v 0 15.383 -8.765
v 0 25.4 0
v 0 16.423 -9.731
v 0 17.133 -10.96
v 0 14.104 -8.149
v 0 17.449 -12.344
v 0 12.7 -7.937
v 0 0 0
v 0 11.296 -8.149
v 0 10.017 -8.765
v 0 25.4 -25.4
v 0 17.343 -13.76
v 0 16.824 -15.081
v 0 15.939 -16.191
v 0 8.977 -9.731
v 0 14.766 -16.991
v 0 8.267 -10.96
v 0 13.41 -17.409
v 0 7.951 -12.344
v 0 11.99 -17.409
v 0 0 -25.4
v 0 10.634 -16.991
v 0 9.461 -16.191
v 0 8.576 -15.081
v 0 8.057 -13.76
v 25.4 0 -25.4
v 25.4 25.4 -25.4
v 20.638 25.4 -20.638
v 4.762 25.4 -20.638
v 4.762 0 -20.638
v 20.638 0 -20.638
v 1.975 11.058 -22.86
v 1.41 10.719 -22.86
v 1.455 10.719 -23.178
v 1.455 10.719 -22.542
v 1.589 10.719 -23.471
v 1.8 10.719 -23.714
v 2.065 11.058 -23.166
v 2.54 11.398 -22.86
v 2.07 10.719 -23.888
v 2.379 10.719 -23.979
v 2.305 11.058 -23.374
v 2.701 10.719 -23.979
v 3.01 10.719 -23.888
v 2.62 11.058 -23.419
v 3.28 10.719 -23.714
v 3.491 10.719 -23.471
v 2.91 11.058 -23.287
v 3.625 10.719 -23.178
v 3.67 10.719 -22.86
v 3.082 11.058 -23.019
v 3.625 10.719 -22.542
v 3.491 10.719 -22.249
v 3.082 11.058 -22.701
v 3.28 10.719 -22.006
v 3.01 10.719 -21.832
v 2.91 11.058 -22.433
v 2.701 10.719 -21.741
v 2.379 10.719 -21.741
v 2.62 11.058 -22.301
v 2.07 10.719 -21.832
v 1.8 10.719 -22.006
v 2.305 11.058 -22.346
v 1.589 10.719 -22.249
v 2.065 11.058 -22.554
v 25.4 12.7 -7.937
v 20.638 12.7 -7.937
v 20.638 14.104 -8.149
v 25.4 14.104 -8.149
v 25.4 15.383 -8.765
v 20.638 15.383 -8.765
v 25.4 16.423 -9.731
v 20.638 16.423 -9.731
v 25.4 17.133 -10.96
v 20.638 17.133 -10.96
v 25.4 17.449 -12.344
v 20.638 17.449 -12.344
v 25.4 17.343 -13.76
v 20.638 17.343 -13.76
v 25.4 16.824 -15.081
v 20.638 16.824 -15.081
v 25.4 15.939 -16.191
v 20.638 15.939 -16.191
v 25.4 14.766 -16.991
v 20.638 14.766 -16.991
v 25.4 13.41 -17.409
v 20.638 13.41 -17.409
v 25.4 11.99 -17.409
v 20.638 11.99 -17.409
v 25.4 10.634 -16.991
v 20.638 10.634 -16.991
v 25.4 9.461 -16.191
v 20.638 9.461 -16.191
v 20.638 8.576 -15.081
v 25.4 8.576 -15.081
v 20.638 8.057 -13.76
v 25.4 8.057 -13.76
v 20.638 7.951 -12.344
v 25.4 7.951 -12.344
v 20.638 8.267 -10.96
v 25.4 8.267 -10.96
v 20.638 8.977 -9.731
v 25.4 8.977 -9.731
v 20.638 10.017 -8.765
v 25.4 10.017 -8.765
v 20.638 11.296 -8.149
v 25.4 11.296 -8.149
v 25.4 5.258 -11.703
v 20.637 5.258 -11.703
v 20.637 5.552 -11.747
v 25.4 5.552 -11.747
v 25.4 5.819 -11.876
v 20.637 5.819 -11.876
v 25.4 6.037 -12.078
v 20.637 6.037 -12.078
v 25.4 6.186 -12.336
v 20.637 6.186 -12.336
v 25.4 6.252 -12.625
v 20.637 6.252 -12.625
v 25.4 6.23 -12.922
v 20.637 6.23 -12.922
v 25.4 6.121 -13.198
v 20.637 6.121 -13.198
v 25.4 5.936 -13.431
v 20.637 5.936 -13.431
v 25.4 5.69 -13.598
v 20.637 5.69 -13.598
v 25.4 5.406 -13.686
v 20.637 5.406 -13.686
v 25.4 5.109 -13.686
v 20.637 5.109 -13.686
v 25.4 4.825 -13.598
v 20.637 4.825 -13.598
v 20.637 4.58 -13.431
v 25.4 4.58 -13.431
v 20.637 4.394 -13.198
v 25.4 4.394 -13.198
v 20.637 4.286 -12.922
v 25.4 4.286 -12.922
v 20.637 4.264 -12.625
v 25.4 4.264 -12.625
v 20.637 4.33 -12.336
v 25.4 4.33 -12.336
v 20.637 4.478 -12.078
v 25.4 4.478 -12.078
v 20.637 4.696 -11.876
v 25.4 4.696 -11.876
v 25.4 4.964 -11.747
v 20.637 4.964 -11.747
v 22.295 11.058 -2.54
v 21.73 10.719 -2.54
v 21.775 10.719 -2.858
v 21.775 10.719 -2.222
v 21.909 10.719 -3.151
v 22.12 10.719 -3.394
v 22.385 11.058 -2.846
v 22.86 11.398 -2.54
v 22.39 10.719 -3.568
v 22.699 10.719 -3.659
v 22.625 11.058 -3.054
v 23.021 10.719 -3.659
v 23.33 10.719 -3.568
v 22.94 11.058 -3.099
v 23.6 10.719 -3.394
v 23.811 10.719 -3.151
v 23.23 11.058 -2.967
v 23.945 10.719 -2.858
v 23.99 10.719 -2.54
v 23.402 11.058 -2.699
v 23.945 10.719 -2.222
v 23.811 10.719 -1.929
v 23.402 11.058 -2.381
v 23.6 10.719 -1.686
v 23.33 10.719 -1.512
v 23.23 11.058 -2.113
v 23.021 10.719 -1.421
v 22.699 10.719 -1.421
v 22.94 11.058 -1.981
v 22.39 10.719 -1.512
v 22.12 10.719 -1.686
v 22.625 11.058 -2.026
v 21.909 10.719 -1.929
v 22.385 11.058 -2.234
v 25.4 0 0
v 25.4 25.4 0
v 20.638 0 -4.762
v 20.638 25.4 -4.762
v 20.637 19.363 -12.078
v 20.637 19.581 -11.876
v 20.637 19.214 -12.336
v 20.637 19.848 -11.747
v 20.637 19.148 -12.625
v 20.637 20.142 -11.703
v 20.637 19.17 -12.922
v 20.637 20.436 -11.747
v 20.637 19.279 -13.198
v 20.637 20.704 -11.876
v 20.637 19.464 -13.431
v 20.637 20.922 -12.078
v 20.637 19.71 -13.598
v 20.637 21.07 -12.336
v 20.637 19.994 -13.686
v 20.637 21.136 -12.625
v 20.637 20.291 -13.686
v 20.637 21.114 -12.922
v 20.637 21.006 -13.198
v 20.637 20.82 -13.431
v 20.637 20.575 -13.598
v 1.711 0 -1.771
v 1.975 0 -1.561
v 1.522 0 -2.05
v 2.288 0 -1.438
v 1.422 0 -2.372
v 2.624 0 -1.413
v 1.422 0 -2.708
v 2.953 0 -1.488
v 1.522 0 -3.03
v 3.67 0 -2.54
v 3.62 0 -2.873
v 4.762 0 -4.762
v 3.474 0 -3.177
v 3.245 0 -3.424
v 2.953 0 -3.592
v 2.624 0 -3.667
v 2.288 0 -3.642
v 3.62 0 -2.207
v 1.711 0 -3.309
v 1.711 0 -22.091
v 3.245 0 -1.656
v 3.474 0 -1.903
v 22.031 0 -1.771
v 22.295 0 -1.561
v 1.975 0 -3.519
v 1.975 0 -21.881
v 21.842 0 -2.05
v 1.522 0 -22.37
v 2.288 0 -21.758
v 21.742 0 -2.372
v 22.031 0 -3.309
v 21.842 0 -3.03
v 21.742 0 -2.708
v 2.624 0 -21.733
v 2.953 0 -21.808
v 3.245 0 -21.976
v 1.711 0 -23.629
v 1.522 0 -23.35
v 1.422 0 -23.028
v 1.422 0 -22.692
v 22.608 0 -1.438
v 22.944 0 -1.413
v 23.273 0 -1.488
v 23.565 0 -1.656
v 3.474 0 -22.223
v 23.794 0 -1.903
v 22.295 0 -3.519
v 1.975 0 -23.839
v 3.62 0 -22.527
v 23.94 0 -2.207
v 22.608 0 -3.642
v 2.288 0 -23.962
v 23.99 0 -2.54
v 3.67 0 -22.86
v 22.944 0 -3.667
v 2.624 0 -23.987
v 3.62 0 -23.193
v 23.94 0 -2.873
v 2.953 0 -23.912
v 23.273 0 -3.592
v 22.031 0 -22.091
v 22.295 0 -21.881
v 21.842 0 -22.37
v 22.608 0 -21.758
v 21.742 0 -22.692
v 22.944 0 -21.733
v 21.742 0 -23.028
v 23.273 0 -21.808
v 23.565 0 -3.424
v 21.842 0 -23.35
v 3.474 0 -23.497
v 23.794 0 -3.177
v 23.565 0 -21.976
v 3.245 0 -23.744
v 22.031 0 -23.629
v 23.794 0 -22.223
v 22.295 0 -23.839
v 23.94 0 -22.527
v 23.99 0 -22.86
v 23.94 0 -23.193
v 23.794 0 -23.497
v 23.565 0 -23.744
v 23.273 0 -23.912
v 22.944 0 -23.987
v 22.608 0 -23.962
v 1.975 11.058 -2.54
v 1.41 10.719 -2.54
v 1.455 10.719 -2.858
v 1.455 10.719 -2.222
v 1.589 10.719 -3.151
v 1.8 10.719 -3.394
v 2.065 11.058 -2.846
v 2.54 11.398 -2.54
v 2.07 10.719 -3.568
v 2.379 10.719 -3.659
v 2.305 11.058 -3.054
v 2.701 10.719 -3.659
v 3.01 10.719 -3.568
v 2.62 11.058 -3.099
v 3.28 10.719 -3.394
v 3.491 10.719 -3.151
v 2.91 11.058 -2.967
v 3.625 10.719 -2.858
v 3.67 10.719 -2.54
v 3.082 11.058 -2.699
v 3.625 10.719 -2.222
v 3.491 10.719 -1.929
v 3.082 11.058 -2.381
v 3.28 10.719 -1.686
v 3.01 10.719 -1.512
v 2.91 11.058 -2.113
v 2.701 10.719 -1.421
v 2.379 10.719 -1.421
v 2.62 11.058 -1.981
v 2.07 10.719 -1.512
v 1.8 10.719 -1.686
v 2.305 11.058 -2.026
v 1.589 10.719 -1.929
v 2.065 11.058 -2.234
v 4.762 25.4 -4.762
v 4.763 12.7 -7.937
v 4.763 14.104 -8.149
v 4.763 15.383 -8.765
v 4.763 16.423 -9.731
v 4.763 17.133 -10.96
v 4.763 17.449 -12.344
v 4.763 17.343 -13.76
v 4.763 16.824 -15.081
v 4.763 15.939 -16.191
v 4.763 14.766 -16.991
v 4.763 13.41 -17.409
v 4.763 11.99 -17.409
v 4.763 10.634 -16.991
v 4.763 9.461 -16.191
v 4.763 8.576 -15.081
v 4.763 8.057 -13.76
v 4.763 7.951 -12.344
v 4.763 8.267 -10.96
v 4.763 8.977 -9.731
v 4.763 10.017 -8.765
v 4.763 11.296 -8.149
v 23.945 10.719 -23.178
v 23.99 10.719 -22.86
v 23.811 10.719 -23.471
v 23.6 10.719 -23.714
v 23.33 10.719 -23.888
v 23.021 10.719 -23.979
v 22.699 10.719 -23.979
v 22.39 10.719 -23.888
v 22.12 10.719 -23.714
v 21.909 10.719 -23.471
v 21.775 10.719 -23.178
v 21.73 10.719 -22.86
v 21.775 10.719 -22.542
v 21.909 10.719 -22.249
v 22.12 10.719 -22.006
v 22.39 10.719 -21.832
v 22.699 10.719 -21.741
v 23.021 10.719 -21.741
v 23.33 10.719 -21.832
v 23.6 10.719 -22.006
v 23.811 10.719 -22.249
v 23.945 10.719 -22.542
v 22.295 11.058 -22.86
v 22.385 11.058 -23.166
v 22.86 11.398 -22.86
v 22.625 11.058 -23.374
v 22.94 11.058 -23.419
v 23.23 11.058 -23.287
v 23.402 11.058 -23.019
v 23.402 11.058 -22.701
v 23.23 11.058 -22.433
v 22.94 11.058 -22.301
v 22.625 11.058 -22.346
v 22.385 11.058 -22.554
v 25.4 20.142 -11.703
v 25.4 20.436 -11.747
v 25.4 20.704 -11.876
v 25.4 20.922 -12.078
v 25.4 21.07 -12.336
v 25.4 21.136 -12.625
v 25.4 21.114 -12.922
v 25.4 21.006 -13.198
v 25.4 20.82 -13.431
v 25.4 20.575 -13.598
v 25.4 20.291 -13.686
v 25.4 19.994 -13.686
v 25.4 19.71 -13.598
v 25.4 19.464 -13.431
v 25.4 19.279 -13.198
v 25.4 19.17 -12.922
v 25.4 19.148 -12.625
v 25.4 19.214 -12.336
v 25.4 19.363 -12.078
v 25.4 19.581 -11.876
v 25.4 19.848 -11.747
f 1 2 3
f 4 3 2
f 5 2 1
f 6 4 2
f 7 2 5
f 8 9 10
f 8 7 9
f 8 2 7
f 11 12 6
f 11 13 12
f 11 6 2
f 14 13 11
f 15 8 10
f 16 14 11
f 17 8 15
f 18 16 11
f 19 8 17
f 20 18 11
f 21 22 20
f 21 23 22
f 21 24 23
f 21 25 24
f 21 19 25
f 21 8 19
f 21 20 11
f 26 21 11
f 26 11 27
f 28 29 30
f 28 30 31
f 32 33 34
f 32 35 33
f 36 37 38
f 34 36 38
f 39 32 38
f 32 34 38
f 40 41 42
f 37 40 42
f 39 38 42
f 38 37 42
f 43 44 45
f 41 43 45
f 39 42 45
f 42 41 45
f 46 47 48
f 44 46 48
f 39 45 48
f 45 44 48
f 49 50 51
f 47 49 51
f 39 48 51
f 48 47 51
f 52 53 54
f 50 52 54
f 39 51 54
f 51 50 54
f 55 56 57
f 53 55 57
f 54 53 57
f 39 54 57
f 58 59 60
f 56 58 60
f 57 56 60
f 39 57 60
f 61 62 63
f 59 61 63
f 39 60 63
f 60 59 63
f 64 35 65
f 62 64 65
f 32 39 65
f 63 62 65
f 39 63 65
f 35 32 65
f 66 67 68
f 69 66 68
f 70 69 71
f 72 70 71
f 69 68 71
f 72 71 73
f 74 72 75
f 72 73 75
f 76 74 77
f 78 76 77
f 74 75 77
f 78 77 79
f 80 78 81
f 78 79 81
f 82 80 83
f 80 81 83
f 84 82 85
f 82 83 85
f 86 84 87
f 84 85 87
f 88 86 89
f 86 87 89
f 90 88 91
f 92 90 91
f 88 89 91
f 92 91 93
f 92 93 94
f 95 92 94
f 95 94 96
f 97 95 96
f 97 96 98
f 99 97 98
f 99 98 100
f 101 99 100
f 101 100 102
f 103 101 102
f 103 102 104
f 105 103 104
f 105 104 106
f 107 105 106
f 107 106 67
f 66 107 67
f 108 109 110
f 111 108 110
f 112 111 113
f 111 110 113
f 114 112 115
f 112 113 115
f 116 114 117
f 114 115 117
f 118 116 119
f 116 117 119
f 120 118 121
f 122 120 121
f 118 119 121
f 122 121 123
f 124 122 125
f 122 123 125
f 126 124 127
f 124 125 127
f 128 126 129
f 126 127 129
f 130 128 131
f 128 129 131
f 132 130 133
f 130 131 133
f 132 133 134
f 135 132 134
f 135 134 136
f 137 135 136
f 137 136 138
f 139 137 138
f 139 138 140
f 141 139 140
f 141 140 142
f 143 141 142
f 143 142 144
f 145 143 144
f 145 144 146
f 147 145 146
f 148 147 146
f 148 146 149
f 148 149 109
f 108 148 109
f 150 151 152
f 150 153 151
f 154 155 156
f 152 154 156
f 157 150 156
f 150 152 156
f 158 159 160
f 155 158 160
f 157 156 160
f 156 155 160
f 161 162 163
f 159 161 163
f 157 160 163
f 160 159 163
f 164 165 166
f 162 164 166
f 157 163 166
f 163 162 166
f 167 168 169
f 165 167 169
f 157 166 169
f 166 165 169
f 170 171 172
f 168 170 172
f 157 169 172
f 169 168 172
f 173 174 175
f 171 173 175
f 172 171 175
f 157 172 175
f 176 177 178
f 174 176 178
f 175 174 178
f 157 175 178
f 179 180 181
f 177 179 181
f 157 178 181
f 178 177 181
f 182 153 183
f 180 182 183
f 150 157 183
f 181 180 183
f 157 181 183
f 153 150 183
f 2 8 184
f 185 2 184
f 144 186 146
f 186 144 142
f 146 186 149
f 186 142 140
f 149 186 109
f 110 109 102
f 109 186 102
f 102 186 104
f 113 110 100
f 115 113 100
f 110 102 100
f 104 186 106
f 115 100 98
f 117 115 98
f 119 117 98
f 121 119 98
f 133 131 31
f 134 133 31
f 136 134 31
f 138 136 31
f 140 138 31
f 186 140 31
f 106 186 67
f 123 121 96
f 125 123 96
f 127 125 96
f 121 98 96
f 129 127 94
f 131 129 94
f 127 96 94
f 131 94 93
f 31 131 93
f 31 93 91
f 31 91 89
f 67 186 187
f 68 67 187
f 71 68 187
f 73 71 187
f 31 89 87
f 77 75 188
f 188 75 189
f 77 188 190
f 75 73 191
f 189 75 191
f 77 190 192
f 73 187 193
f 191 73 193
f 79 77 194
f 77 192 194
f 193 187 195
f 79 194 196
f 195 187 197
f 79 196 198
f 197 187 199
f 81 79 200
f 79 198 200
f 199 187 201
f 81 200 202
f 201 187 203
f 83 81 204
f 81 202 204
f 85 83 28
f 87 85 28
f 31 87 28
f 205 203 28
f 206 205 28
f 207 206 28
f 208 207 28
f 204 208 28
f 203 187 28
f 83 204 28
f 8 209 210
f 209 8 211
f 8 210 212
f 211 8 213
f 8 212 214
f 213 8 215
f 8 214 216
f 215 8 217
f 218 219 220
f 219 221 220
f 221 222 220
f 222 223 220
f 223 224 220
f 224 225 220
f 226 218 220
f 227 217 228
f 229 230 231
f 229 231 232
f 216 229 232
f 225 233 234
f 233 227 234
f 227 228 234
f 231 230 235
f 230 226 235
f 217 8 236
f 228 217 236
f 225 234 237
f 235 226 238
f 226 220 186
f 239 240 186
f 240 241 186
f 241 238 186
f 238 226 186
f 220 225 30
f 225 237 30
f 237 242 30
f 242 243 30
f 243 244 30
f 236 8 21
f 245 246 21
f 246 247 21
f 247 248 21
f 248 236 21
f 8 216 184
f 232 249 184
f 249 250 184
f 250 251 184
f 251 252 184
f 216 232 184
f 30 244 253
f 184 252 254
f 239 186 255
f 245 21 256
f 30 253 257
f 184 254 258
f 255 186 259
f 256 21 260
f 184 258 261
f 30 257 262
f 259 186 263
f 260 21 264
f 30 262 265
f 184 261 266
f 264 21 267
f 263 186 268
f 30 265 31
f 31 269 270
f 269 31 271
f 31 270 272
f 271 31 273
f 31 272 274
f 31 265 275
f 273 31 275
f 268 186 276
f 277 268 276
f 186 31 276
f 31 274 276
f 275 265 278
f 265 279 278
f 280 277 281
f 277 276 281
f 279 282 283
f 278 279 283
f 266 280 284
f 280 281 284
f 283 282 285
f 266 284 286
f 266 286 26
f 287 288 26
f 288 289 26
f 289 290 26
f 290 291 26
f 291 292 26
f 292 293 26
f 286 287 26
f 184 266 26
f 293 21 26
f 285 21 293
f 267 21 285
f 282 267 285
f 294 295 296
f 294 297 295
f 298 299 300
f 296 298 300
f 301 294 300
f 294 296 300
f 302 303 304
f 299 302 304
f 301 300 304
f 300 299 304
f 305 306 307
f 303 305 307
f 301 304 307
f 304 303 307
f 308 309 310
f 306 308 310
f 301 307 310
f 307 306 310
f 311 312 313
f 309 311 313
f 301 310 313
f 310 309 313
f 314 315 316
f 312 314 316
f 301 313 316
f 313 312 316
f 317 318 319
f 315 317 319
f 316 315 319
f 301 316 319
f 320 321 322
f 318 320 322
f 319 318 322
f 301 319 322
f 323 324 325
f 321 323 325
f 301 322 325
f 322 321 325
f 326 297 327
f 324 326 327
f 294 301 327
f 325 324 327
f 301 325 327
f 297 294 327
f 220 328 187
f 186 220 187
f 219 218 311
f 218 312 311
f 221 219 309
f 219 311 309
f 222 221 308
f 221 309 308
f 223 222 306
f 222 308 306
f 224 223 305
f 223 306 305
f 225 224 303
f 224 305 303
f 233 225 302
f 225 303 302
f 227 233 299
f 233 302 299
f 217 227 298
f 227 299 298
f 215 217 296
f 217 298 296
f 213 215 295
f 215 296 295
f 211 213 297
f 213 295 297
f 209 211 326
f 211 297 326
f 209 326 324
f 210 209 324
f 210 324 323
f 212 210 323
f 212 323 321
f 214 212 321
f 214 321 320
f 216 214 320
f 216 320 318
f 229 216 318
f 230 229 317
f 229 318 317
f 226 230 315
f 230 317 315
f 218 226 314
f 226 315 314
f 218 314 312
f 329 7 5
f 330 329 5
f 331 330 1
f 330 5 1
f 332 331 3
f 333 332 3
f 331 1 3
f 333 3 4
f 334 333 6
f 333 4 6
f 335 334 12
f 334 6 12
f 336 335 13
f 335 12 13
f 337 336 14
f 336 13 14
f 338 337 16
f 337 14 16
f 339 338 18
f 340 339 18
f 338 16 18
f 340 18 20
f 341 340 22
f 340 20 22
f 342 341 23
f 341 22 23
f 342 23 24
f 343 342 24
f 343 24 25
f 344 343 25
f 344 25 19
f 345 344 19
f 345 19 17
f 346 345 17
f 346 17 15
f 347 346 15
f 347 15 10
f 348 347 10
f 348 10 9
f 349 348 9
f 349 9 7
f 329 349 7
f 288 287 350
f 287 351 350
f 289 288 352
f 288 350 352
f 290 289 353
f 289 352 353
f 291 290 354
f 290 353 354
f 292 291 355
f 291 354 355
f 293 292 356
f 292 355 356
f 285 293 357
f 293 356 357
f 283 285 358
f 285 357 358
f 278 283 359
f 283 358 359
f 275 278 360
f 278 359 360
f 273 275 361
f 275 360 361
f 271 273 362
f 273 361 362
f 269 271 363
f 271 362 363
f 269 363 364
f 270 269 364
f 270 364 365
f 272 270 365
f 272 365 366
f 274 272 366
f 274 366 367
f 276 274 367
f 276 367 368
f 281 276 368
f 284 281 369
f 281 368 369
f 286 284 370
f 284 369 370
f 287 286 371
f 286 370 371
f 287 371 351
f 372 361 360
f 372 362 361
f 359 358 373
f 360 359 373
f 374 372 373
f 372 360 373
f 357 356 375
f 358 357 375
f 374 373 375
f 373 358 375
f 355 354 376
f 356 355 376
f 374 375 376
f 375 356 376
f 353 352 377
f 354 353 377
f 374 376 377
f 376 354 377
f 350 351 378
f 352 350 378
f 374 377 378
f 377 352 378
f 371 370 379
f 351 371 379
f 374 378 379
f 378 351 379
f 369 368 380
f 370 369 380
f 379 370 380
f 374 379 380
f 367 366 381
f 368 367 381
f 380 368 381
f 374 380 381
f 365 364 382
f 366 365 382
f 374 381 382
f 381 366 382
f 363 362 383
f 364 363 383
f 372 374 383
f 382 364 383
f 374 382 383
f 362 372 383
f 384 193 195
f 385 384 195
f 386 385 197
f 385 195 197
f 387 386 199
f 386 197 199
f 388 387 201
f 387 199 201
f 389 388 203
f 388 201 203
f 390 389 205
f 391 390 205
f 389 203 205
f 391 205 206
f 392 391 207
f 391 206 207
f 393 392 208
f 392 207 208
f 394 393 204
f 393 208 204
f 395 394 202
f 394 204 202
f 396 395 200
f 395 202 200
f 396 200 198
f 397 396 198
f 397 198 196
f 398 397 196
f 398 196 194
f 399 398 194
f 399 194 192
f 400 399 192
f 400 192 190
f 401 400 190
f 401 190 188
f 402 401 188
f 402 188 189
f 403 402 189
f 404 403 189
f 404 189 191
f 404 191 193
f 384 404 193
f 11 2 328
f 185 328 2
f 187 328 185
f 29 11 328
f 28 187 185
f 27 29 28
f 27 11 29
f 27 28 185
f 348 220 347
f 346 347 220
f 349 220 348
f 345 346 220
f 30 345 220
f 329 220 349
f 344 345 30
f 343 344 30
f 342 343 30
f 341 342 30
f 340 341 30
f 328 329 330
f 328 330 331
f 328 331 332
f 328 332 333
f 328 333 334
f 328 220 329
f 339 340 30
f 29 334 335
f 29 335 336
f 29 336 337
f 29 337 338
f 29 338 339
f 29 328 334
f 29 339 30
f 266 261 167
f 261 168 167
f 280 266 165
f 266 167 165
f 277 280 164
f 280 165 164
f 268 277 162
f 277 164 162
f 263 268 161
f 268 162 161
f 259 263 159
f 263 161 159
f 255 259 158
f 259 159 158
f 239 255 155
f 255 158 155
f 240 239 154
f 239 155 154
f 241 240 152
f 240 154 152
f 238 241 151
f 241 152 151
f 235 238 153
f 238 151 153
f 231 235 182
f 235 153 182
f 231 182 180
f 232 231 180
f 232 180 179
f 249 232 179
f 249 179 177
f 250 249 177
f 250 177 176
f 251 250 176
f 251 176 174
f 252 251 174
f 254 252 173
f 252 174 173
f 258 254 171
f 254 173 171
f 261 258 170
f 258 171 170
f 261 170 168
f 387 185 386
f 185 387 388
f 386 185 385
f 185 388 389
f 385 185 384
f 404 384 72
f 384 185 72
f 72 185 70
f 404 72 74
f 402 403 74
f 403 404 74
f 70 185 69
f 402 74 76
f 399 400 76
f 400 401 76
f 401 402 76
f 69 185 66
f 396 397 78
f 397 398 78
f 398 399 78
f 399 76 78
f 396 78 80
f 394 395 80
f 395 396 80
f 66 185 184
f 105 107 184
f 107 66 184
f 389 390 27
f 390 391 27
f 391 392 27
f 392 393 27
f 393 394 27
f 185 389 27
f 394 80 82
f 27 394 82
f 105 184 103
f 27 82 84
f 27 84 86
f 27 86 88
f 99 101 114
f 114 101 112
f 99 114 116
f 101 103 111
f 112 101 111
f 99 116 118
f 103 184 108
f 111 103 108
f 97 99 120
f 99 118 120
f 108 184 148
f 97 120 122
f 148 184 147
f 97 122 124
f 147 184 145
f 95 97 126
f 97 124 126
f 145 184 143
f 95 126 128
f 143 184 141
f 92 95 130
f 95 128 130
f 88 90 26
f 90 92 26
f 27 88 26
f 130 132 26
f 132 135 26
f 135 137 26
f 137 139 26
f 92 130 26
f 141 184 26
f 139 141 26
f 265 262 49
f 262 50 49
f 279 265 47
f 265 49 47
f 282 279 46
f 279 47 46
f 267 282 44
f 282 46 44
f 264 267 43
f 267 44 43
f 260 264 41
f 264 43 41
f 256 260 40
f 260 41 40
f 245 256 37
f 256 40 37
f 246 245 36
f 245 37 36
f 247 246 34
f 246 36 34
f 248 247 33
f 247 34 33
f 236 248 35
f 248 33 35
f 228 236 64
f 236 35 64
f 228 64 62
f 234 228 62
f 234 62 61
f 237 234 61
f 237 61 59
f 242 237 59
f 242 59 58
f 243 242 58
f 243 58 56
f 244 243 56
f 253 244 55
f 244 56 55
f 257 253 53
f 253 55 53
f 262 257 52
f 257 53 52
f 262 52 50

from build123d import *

# Parameters (mm, degrees)
SKETCH1_W                     = 25.4
SKETCH1_H                     = 25.4
BOSS_EXTRUDE1_DEPTH           = 25.4
SKETCH2_W                     = 15.875
SKETCH2_H                     = 15.875
CUT_EXTRUDE1_DEPTH            = 26.4
TAP_DRILL_FOR_4_40_TAP1_D     = 2.2606
TAP_DRILL_FOR_4_40_TAP1_DEPTH = 10.7188
TAP_DRILL_FOR_4_40_TAP1_TIP   = 0.679152758
F_3_8_0_375_DIAMETER_HOLE1_D  = 9.525
TAP_DRILL_FOR_3_48_TAP1_D     = 1.9939
TAP_DRILL_FOR_3_48_TAP1_DEPTH = 4.7625


with BuildPart() as part:
    # Sketch1 → Boss-Extrude1 (new body)
    with BuildSketch(Plane(origin=(0, 0, 0), x_dir=(1, 0, 0), z_dir=(0, 1, 0))):
        with Locations((12.7, 12.7)):
            Rectangle(SKETCH1_W, SKETCH1_H)
    extrude(amount=BOSS_EXTRUDE1_DEPTH)

    # Sketch2 → Cut-Extrude1 (cut, through all)
    with BuildSketch(Plane(origin=(0, 25.4, 0), x_dir=(1, 0, 0), z_dir=(0, 1, 0))):
        with Locations((12.7, 12.7)):
            Rectangle(SKETCH2_W, SKETCH2_H)
    extrude(amount=-CUT_EXTRUDE1_DEPTH, mode=Mode.SUBTRACT)

    # Tap Drill for #4-40 Tap1
    with Locations(Plane(origin=(0, 0, 0), x_dir=(-1, 0, 0), z_dir=(0, -1, 0))):
        with Locations((-2.54, 2.54), (-22.86, 2.54), (-22.86, 22.86), (-2.54, 22.86)):
            Hole(TAP_DRILL_FOR_4_40_TAP1_D / 2, depth=TAP_DRILL_FOR_4_40_TAP1_DEPTH)
            with Locations((0, 0, -(TAP_DRILL_FOR_4_40_TAP1_DEPTH + TAP_DRILL_FOR_4_40_TAP1_TIP / 2))):  # 118° drill point
                Cone(0, TAP_DRILL_FOR_4_40_TAP1_D / 2, TAP_DRILL_FOR_4_40_TAP1_TIP, mode=Mode.SUBTRACT)

    # 3/8 (0.375) Diameter Hole1 (through all)
    with Locations(Plane(origin=(25.4, 0, 0), x_dir=(0, 0, -1), z_dir=(1, 0, 0))):
        with Locations((12.7, 12.7)):
            Hole(F_3_8_0_375_DIAMETER_HOLE1_D / 2)

    # Tap Drill for #3-48 Tap1
    with Locations(Plane(origin=(25.4, 0, 0), x_dir=(0, 0, -1), z_dir=(1, 0, 0))):
        with Locations((12.7, 20.1422), (12.7, 5.2578)):
            Hole(TAP_DRILL_FOR_3_48_TAP1_D / 2, depth=TAP_DRILL_FOR_3_48_TAP1_DEPTH)


solid = part.part
